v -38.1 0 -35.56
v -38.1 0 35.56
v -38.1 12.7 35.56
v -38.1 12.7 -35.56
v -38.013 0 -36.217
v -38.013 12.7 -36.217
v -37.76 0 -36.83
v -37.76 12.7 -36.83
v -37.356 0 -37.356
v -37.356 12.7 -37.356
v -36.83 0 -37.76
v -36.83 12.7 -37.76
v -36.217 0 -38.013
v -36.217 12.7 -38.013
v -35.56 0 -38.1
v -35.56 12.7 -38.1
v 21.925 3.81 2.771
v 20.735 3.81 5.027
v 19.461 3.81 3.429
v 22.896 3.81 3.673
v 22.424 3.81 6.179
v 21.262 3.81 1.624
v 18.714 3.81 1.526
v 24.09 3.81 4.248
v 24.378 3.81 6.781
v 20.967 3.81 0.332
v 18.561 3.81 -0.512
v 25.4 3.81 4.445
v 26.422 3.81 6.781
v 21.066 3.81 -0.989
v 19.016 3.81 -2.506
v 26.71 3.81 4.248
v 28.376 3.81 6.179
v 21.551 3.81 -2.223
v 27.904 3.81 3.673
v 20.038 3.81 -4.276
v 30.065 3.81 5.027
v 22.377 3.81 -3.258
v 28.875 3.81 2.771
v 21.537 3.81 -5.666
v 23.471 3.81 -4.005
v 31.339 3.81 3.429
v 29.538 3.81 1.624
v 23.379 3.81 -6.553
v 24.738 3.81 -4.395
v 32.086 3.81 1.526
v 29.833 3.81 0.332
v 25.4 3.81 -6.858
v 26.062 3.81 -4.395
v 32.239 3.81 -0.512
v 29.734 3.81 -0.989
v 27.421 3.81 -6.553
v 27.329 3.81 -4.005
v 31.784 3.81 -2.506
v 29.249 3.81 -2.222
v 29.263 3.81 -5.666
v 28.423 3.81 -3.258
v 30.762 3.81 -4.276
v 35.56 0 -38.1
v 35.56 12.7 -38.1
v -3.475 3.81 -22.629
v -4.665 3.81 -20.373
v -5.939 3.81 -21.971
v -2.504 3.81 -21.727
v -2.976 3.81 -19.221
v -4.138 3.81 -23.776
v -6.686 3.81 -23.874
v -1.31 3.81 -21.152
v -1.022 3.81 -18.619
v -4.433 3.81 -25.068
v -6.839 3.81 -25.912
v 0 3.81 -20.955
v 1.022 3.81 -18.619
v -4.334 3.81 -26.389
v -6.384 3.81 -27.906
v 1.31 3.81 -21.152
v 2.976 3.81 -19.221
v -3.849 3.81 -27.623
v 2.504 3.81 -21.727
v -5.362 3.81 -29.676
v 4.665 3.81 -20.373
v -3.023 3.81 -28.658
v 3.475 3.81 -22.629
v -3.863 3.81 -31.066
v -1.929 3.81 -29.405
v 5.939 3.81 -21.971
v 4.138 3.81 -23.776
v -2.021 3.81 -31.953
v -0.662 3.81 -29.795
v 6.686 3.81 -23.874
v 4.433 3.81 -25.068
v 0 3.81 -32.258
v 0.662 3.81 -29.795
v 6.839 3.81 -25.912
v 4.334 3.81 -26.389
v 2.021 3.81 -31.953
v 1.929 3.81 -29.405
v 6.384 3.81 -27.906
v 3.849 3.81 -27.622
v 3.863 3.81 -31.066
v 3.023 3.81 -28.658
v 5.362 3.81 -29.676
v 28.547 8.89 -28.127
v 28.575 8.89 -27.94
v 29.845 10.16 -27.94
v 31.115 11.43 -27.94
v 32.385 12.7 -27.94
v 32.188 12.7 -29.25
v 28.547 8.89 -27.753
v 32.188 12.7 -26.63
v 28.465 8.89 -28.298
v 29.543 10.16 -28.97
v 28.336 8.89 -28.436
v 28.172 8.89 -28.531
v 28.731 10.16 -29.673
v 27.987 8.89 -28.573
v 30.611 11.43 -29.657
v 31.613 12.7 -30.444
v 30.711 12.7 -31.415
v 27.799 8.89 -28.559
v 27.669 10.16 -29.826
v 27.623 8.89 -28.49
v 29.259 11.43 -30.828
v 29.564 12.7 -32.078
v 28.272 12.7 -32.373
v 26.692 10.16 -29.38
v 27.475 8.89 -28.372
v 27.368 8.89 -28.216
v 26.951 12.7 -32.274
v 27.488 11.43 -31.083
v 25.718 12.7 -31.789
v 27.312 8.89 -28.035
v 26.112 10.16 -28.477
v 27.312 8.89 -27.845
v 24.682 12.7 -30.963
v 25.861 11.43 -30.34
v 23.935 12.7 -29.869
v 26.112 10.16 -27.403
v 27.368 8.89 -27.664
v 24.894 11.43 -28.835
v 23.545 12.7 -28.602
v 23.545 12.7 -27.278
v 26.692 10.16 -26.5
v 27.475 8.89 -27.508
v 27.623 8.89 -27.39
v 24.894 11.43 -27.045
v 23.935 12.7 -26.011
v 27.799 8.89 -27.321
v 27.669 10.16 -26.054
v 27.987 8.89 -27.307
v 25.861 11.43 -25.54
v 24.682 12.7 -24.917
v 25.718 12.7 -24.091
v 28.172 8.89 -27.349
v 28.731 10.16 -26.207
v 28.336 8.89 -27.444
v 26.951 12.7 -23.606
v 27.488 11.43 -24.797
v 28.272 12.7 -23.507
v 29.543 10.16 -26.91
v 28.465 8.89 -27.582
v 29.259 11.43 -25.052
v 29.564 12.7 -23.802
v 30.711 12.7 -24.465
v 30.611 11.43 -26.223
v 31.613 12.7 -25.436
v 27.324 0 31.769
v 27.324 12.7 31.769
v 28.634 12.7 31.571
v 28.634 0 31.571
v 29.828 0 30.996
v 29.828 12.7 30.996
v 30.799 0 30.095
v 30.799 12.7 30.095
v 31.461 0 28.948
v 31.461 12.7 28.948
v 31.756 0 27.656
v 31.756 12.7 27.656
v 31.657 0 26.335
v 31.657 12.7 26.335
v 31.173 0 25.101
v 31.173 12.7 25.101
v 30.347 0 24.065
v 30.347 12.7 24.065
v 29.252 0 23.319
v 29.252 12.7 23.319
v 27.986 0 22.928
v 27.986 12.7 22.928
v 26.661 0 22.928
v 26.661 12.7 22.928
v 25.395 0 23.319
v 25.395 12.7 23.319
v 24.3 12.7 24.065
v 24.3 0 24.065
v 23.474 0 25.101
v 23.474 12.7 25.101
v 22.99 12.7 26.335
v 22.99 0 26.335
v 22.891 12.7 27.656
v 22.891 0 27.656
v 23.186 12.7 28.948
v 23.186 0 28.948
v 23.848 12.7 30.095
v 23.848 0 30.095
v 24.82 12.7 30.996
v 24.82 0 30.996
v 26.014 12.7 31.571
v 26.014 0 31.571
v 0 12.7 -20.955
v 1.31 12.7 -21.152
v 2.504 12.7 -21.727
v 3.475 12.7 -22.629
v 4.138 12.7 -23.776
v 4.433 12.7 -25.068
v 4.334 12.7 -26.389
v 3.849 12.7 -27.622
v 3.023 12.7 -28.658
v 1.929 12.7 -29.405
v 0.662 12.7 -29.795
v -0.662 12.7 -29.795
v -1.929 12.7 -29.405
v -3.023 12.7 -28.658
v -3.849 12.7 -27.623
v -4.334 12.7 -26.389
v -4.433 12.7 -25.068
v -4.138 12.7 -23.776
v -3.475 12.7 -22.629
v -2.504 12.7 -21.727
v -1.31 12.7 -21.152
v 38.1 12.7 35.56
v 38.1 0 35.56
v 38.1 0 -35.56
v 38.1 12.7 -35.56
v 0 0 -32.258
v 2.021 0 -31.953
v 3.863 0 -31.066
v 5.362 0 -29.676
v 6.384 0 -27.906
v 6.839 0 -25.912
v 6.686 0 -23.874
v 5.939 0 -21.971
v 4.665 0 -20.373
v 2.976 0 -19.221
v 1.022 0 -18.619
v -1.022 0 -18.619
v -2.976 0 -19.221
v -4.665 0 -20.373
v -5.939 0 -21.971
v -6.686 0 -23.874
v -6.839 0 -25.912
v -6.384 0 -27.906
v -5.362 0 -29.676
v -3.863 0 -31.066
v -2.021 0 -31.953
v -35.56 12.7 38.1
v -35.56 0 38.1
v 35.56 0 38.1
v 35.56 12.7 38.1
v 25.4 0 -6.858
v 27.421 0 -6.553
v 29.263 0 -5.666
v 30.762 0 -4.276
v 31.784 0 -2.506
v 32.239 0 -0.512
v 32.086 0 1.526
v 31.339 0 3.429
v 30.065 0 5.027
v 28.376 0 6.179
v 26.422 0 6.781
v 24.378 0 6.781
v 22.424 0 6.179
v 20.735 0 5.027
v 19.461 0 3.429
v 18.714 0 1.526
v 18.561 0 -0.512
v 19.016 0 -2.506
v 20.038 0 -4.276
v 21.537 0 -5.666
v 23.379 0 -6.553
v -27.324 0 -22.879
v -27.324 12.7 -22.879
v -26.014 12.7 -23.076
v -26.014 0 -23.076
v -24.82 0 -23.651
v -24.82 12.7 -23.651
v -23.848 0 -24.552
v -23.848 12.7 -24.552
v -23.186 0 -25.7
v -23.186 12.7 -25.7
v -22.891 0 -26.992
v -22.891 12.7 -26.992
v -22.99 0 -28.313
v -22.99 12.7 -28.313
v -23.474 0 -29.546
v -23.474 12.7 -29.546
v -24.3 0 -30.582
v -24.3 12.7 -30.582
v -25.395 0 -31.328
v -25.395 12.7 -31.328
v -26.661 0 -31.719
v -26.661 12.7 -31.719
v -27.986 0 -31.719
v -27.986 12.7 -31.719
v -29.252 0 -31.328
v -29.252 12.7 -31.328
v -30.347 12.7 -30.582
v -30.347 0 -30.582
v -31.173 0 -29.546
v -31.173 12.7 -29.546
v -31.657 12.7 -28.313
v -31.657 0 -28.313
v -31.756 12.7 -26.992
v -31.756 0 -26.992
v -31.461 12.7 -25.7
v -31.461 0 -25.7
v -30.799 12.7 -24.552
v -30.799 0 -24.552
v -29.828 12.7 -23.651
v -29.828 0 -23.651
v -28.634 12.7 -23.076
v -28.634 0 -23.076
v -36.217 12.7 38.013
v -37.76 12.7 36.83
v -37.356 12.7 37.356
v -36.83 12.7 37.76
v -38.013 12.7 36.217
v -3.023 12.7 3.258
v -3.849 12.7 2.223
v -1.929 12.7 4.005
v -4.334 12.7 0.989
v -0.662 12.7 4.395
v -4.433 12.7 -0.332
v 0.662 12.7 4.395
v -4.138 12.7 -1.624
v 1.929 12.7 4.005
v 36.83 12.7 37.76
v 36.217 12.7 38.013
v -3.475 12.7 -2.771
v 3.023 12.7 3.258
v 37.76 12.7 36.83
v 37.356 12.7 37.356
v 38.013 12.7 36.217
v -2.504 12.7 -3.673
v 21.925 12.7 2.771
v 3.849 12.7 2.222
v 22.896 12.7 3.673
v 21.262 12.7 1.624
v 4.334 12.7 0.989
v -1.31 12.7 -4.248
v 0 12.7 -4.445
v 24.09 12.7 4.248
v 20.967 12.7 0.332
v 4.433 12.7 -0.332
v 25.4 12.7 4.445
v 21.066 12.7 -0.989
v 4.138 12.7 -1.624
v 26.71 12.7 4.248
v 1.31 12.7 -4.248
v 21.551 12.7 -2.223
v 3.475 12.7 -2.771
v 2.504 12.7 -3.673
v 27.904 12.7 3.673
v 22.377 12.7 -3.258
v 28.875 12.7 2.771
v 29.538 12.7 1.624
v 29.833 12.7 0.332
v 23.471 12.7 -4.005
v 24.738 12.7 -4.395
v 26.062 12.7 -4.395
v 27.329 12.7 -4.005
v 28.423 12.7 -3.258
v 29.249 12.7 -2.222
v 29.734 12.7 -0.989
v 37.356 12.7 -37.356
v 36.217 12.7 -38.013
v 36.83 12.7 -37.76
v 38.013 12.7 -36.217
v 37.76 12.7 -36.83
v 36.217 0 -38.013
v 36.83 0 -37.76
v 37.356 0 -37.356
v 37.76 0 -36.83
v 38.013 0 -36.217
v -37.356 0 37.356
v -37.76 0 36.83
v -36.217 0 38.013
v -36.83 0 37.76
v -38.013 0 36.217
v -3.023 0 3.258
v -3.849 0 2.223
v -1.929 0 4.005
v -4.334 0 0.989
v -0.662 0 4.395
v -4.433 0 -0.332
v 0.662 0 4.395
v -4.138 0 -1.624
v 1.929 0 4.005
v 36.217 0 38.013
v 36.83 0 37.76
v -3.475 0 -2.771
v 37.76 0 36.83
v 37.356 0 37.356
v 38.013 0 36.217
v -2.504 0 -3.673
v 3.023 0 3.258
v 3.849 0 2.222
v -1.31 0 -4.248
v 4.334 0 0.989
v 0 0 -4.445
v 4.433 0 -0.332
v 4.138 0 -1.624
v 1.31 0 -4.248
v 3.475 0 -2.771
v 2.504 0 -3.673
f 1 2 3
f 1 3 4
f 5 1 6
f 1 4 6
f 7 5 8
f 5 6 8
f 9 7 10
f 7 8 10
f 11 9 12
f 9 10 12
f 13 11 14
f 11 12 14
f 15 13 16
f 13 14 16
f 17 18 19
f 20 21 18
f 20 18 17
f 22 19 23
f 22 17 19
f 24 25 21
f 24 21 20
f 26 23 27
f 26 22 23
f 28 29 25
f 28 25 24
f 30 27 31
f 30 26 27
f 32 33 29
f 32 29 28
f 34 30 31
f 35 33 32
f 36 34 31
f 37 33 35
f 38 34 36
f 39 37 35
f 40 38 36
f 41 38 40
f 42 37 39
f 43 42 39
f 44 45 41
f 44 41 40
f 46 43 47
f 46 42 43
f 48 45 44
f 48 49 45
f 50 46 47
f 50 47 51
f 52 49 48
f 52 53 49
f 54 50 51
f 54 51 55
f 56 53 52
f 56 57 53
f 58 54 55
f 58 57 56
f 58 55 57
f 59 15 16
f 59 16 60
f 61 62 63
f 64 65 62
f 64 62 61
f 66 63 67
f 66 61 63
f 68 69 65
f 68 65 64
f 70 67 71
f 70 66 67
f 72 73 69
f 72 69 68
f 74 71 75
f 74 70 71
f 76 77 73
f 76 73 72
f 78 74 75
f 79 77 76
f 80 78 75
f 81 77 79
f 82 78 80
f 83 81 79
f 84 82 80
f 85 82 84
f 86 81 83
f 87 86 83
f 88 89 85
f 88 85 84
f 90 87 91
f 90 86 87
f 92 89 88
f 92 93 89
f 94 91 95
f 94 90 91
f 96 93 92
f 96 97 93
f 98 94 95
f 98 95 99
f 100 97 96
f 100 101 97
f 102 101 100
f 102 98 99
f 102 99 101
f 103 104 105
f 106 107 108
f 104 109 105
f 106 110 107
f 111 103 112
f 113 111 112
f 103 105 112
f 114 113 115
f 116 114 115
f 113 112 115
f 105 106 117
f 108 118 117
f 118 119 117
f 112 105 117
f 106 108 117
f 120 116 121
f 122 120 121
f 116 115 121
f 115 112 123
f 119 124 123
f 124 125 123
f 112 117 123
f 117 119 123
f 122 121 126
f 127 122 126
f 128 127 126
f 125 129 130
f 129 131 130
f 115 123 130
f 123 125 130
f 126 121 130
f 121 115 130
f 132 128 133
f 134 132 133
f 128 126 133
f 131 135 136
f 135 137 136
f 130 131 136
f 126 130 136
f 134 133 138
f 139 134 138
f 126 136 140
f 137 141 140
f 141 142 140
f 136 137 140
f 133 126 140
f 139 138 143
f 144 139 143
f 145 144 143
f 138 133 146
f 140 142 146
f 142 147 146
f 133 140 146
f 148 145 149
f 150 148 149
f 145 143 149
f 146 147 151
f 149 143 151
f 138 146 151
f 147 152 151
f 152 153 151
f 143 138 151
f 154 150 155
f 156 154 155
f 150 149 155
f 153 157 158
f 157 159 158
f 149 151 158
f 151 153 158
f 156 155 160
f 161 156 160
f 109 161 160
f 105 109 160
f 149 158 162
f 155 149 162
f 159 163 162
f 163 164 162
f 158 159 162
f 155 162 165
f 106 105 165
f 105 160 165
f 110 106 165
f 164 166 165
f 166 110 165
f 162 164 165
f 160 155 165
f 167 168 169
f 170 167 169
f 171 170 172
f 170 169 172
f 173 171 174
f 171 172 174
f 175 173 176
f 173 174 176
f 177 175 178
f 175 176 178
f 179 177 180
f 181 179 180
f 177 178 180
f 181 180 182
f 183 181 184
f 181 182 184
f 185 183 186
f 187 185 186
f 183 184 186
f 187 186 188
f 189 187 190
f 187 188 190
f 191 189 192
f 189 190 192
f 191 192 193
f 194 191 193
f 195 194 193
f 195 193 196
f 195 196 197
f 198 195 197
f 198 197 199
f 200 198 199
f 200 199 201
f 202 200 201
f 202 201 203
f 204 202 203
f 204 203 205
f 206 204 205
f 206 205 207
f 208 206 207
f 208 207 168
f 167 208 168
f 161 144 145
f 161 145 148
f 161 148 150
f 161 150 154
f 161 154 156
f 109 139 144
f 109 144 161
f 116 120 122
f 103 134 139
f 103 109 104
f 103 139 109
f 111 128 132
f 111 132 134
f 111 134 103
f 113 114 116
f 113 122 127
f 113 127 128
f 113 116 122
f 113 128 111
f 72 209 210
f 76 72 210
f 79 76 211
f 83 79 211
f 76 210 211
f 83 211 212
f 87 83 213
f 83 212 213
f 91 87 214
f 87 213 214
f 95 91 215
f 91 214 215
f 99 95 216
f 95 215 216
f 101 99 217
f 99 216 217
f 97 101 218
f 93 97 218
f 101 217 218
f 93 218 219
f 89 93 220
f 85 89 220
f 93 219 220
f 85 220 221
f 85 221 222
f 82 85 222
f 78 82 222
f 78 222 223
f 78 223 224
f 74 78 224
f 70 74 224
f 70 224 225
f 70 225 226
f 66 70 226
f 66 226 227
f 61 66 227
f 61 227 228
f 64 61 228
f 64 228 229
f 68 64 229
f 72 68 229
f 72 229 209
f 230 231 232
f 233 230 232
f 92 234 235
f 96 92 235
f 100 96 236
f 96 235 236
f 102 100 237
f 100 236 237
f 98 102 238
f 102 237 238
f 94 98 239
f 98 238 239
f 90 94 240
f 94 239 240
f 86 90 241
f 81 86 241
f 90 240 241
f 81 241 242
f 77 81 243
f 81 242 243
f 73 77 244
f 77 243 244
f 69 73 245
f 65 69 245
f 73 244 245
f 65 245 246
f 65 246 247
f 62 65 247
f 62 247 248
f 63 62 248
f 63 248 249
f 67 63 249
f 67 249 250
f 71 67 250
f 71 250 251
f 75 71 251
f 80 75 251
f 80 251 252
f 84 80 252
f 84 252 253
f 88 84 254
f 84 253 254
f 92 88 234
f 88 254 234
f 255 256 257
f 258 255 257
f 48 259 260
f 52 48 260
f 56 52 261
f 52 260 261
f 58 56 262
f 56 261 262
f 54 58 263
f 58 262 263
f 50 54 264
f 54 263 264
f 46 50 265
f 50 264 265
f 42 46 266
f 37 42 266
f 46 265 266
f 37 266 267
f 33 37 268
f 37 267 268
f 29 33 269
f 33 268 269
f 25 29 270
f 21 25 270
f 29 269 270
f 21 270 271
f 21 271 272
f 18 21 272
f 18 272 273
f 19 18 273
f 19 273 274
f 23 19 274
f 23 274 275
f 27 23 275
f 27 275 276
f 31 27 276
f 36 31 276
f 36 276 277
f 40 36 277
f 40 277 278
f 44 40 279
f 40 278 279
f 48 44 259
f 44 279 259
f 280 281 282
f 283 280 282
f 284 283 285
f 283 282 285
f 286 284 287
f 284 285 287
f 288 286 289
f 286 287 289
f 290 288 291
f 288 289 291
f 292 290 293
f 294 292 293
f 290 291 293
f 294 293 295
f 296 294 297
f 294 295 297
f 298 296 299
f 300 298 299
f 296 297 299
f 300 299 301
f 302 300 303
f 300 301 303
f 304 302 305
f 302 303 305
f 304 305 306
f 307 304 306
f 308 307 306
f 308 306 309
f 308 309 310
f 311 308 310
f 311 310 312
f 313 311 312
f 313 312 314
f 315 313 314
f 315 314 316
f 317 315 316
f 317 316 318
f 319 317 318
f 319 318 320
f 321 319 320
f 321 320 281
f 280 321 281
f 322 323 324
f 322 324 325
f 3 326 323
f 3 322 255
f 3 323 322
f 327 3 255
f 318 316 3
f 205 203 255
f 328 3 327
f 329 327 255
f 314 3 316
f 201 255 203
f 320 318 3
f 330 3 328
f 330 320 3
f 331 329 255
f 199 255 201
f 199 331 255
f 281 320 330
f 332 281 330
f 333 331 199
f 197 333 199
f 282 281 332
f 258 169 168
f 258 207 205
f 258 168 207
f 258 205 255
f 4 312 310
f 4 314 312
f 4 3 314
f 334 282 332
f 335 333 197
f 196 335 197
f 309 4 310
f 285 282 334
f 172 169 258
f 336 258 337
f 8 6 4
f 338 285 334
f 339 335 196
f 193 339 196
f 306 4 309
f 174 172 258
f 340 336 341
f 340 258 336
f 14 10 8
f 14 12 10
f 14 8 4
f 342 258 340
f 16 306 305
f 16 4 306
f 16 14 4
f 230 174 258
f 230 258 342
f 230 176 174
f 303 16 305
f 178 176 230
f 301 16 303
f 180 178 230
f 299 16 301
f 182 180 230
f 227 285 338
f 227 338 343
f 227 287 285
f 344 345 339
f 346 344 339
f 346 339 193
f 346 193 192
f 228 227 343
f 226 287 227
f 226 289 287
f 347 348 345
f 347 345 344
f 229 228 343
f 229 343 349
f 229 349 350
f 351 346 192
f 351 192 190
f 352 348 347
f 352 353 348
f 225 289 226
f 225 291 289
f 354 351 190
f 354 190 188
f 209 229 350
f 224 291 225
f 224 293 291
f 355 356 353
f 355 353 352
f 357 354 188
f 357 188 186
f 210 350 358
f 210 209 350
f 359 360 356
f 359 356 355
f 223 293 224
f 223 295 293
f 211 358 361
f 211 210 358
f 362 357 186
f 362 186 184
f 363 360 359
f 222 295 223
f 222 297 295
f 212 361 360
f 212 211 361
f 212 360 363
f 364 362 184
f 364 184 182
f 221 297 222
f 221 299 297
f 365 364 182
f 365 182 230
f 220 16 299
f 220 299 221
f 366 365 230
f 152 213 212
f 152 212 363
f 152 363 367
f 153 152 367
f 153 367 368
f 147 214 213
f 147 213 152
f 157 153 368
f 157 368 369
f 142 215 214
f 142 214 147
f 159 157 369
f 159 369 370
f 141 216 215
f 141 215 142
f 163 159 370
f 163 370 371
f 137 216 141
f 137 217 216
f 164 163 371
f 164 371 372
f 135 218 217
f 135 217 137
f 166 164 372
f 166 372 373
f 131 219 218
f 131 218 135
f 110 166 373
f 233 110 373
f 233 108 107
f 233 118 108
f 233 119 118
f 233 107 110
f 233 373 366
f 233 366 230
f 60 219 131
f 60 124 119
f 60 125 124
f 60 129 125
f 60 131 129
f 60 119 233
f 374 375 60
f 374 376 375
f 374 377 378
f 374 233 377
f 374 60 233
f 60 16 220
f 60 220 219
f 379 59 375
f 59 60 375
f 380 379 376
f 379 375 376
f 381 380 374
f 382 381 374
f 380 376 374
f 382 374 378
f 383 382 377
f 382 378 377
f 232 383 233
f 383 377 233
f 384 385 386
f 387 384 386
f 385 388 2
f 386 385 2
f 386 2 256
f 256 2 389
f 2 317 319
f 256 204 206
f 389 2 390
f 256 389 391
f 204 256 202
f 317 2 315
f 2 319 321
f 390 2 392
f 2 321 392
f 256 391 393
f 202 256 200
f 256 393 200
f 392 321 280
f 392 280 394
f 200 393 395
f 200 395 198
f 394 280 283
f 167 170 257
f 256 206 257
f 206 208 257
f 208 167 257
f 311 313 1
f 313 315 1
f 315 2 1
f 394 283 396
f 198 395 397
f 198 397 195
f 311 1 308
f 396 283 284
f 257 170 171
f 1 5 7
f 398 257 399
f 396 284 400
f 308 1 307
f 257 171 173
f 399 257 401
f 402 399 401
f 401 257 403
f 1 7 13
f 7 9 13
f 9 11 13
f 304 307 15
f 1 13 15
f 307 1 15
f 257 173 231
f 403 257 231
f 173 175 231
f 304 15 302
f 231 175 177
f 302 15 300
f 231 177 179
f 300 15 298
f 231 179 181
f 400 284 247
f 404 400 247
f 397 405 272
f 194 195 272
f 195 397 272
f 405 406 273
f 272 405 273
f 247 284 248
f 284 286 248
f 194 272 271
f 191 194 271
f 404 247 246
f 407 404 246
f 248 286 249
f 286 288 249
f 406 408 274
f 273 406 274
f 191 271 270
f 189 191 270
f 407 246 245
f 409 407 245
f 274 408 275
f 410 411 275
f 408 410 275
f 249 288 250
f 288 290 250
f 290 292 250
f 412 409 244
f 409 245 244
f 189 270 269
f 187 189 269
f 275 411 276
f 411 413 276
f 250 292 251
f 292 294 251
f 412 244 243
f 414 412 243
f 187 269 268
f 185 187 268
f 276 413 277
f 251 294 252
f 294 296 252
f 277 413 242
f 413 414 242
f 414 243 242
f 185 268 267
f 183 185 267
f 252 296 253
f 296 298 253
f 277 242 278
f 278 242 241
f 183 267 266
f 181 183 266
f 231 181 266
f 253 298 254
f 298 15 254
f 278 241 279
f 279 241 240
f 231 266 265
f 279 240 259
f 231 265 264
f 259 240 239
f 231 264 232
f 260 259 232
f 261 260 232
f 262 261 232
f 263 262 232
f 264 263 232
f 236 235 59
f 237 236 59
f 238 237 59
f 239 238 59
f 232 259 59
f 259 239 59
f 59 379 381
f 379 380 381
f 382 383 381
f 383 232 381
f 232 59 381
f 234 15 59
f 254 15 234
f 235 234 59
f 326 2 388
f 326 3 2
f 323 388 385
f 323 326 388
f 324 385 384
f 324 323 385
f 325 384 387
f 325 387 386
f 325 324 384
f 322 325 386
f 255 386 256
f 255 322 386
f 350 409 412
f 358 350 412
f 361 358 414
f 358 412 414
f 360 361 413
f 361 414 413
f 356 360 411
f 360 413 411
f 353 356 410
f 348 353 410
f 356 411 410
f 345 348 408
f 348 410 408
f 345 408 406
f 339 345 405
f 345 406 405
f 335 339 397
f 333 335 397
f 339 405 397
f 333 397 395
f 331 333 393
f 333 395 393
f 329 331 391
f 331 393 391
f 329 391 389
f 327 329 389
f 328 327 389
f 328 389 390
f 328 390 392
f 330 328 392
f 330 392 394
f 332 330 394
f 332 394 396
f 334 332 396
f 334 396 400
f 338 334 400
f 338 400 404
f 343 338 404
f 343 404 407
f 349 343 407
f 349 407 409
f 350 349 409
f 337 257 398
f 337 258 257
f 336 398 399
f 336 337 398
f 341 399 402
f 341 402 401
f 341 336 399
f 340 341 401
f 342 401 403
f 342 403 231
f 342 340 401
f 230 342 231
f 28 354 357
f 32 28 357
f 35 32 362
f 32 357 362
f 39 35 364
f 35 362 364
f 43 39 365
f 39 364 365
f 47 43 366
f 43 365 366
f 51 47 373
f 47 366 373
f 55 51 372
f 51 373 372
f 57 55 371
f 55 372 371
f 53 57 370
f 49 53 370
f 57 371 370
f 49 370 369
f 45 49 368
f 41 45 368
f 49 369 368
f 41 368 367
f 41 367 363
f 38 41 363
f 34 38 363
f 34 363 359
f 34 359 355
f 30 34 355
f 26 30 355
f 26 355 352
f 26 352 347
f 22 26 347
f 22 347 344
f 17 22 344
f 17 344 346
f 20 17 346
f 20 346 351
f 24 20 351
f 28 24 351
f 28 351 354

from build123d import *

# Parameters (mm, degrees)
SKETCH1_W           = 76.2
SKETCH1_H           = 76.2
BOSS_EXTRUDE1_DEPTH = 12.7
CUT_EXTRUDE1_REACH  = 57.358
SKETCH2_R           = 4.445
CUT_EXTRUDE2_REACH  = 57.358
SKETCH6_R           = 4.445
SKETCH7_R           = 4.445
CUT_EXTRUDE3_DEPTH  = 3.81
CUT_EXTRUDE3_DRAFT  = -45
CUT_EXTRUDE4_REACH  = 57.358
SKETCH12_R          = 4.445
SKETCH13_R          = 6.858
CUT_EXTRUDE5_DEPTH  = 3.81
FILLET1_R           = 2.54


with BuildPart() as part:
    # Sketch1 → Boss-Extrude1 (new body)
    with BuildSketch(Plane(origin=(0, 0, 0), x_dir=(1, 0, 0), z_dir=(0, 1, 0))):
        Rectangle(SKETCH1_W, SKETCH1_H)
    extrude(amount=BOSS_EXTRUDE1_DEPTH)

    # Sketch2 → Cut-Extrude1 (cut, up to next)
    with BuildSketch(Plane.XZ, mode=Mode.PRIVATE) as cut_extrude1_sk1:
        with Locations(Location((0, 0, 0), (0, 0, 270))):
            Circle(SKETCH2_R)
    cut_extrude1_tool1 = extrude(cut_extrude1_sk1.sketch, amount=-CUT_EXTRUDE1_REACH, mode=Mode.PRIVATE) & part.part
    add(cut_extrude1_tool1.solids().sort_by_distance((0, 0, 0))[0], mode=Mode.SUBTRACT)

    # Sketch6 → Cut-Extrude2 (cut, up to next)
    with BuildSketch(Plane(origin=(0, 12.7, 0), x_dir=(1, 0, 0), z_dir=(0, 1, 0)), mode=Mode.PRIVATE) as cut_extrude2_sk1:
        with Locations(Location((-27.323692655, 27.323692655, 0), (0, 0, 270))):
            Circle(SKETCH6_R)
    cut_extrude2_tool1 = extrude(cut_extrude2_sk1.sketch, amount=-CUT_EXTRUDE2_REACH, mode=Mode.PRIVATE) & part.part
    # Sketch6 → Cut-Extrude2 (cut, up to next)
    with BuildSketch(Plane(origin=(0, 12.7, 0), x_dir=(1, 0, 0), z_dir=(0, 1, 0)), mode=Mode.PRIVATE) as cut_extrude2_sk2:
        with Locations(Location((27.323692655, -27.323692655, 0), (0, 0, 270))):
            Circle(SKETCH6_R)
    cut_extrude2_tool2 = extrude(cut_extrude2_sk2.sketch, amount=-CUT_EXTRUDE2_REACH, mode=Mode.PRIVATE) & part.part
    add(cut_extrude2_tool1.solids().sort_by_distance((-27.323693, 12.7, -27.323693))[0], mode=Mode.SUBTRACT)
    add(cut_extrude2_tool2.solids().sort_by_distance((27.323693, 12.7, 27.323693))[0], mode=Mode.SUBTRACT)


with BuildPart() as cut_extrude3_tool:
    # Sketch7 → Cut-Extrude3 (with draft: the straight prism first)
    with BuildSketch(Plane(origin=(0, 12.7, 0), x_dir=(1, 0, 0), z_dir=(0, 1, 0))):
        with Locations((27.94, 27.94)):
            Circle(SKETCH7_R)
    extrude(amount=-CUT_EXTRUDE3_DEPTH)
    # Cut-Extrude3: the draft: its side faces are tilted about the plane it starts from
    cut_extrude3_sides = [cut_extrude3_tool.faces().sort_by_distance(p)[0] for p in [
        (23.495, 10.795, -27.94),
    ]]
    draft(cut_extrude3_sides, Plane(origin=(0, 12.7, 0), x_dir=(1, 0, 0), z_dir=(0, 1, 0)), CUT_EXTRUDE3_DRAFT)


with BuildPart() as part_1:
    add(part.part)

    # Cut-Extrude3: cut by cut_extrude3_tool
    add(cut_extrude3_tool.part, mode=Mode.SUBTRACT)

    # Sketch12 → Cut-Extrude4 (cut, up to next)
    with BuildSketch(Plane(origin=(0, 12.7, 0), x_dir=(1, 0, 0), z_dir=(0, 1, 0)), mode=Mode.PRIVATE) as cut_extrude4_sk1:
        with Locations(Location((0, 25.4, 0), (0, 0, 270))):
            Circle(SKETCH12_R)
    cut_extrude4_tool1 = extrude(cut_extrude4_sk1.sketch, amount=-CUT_EXTRUDE4_REACH, mode=Mode.PRIVATE) & part_1.part
    # Sketch12 → Cut-Extrude4 (cut, up to next)
    with BuildSketch(Plane(origin=(0, 12.7, 0), x_dir=(1, 0, 0), z_dir=(0, 1, 0)), mode=Mode.PRIVATE) as cut_extrude4_sk2:
        with Locations(Location((25.4, 0, 0), (0, 0, 270))):
            Circle(SKETCH12_R)
    cut_extrude4_tool2 = extrude(cut_extrude4_sk2.sketch, amount=-CUT_EXTRUDE4_REACH, mode=Mode.PRIVATE) & part_1.part
    add(cut_extrude4_tool1.solids().sort_by_distance((0, 12.7, -25.4))[0], mode=Mode.SUBTRACT)
    add(cut_extrude4_tool2.solids().sort_by_distance((25.4, 12.7, 0))[0], mode=Mode.SUBTRACT)

    # Sketch13 → Cut-Extrude5 (cut)
    with BuildSketch(Plane.XZ):
        with Locations(Location((0, -25.4, 0), (0, 0, 270))):
            Circle(SKETCH13_R)
        with Locations(Location((25.4, 0, 0), (0, 0, 270))):
            Circle(SKETCH13_R)
    extrude(amount=-CUT_EXTRUDE5_DEPTH, mode=Mode.SUBTRACT)

    # Fillet1
    fillet1_edges = [part_1.edges().sort_by_distance(p)[0] for p in [
        (38.1, 6.35, 38.1),
        (-38.1, 6.35, 38.1),
        (-38.1, 6.35, -38.1),
        (38.1, 6.35, -38.1),
    ]]
    fillet(fillet1_edges, radius=FILLET1_R)


solid = part_1.part
